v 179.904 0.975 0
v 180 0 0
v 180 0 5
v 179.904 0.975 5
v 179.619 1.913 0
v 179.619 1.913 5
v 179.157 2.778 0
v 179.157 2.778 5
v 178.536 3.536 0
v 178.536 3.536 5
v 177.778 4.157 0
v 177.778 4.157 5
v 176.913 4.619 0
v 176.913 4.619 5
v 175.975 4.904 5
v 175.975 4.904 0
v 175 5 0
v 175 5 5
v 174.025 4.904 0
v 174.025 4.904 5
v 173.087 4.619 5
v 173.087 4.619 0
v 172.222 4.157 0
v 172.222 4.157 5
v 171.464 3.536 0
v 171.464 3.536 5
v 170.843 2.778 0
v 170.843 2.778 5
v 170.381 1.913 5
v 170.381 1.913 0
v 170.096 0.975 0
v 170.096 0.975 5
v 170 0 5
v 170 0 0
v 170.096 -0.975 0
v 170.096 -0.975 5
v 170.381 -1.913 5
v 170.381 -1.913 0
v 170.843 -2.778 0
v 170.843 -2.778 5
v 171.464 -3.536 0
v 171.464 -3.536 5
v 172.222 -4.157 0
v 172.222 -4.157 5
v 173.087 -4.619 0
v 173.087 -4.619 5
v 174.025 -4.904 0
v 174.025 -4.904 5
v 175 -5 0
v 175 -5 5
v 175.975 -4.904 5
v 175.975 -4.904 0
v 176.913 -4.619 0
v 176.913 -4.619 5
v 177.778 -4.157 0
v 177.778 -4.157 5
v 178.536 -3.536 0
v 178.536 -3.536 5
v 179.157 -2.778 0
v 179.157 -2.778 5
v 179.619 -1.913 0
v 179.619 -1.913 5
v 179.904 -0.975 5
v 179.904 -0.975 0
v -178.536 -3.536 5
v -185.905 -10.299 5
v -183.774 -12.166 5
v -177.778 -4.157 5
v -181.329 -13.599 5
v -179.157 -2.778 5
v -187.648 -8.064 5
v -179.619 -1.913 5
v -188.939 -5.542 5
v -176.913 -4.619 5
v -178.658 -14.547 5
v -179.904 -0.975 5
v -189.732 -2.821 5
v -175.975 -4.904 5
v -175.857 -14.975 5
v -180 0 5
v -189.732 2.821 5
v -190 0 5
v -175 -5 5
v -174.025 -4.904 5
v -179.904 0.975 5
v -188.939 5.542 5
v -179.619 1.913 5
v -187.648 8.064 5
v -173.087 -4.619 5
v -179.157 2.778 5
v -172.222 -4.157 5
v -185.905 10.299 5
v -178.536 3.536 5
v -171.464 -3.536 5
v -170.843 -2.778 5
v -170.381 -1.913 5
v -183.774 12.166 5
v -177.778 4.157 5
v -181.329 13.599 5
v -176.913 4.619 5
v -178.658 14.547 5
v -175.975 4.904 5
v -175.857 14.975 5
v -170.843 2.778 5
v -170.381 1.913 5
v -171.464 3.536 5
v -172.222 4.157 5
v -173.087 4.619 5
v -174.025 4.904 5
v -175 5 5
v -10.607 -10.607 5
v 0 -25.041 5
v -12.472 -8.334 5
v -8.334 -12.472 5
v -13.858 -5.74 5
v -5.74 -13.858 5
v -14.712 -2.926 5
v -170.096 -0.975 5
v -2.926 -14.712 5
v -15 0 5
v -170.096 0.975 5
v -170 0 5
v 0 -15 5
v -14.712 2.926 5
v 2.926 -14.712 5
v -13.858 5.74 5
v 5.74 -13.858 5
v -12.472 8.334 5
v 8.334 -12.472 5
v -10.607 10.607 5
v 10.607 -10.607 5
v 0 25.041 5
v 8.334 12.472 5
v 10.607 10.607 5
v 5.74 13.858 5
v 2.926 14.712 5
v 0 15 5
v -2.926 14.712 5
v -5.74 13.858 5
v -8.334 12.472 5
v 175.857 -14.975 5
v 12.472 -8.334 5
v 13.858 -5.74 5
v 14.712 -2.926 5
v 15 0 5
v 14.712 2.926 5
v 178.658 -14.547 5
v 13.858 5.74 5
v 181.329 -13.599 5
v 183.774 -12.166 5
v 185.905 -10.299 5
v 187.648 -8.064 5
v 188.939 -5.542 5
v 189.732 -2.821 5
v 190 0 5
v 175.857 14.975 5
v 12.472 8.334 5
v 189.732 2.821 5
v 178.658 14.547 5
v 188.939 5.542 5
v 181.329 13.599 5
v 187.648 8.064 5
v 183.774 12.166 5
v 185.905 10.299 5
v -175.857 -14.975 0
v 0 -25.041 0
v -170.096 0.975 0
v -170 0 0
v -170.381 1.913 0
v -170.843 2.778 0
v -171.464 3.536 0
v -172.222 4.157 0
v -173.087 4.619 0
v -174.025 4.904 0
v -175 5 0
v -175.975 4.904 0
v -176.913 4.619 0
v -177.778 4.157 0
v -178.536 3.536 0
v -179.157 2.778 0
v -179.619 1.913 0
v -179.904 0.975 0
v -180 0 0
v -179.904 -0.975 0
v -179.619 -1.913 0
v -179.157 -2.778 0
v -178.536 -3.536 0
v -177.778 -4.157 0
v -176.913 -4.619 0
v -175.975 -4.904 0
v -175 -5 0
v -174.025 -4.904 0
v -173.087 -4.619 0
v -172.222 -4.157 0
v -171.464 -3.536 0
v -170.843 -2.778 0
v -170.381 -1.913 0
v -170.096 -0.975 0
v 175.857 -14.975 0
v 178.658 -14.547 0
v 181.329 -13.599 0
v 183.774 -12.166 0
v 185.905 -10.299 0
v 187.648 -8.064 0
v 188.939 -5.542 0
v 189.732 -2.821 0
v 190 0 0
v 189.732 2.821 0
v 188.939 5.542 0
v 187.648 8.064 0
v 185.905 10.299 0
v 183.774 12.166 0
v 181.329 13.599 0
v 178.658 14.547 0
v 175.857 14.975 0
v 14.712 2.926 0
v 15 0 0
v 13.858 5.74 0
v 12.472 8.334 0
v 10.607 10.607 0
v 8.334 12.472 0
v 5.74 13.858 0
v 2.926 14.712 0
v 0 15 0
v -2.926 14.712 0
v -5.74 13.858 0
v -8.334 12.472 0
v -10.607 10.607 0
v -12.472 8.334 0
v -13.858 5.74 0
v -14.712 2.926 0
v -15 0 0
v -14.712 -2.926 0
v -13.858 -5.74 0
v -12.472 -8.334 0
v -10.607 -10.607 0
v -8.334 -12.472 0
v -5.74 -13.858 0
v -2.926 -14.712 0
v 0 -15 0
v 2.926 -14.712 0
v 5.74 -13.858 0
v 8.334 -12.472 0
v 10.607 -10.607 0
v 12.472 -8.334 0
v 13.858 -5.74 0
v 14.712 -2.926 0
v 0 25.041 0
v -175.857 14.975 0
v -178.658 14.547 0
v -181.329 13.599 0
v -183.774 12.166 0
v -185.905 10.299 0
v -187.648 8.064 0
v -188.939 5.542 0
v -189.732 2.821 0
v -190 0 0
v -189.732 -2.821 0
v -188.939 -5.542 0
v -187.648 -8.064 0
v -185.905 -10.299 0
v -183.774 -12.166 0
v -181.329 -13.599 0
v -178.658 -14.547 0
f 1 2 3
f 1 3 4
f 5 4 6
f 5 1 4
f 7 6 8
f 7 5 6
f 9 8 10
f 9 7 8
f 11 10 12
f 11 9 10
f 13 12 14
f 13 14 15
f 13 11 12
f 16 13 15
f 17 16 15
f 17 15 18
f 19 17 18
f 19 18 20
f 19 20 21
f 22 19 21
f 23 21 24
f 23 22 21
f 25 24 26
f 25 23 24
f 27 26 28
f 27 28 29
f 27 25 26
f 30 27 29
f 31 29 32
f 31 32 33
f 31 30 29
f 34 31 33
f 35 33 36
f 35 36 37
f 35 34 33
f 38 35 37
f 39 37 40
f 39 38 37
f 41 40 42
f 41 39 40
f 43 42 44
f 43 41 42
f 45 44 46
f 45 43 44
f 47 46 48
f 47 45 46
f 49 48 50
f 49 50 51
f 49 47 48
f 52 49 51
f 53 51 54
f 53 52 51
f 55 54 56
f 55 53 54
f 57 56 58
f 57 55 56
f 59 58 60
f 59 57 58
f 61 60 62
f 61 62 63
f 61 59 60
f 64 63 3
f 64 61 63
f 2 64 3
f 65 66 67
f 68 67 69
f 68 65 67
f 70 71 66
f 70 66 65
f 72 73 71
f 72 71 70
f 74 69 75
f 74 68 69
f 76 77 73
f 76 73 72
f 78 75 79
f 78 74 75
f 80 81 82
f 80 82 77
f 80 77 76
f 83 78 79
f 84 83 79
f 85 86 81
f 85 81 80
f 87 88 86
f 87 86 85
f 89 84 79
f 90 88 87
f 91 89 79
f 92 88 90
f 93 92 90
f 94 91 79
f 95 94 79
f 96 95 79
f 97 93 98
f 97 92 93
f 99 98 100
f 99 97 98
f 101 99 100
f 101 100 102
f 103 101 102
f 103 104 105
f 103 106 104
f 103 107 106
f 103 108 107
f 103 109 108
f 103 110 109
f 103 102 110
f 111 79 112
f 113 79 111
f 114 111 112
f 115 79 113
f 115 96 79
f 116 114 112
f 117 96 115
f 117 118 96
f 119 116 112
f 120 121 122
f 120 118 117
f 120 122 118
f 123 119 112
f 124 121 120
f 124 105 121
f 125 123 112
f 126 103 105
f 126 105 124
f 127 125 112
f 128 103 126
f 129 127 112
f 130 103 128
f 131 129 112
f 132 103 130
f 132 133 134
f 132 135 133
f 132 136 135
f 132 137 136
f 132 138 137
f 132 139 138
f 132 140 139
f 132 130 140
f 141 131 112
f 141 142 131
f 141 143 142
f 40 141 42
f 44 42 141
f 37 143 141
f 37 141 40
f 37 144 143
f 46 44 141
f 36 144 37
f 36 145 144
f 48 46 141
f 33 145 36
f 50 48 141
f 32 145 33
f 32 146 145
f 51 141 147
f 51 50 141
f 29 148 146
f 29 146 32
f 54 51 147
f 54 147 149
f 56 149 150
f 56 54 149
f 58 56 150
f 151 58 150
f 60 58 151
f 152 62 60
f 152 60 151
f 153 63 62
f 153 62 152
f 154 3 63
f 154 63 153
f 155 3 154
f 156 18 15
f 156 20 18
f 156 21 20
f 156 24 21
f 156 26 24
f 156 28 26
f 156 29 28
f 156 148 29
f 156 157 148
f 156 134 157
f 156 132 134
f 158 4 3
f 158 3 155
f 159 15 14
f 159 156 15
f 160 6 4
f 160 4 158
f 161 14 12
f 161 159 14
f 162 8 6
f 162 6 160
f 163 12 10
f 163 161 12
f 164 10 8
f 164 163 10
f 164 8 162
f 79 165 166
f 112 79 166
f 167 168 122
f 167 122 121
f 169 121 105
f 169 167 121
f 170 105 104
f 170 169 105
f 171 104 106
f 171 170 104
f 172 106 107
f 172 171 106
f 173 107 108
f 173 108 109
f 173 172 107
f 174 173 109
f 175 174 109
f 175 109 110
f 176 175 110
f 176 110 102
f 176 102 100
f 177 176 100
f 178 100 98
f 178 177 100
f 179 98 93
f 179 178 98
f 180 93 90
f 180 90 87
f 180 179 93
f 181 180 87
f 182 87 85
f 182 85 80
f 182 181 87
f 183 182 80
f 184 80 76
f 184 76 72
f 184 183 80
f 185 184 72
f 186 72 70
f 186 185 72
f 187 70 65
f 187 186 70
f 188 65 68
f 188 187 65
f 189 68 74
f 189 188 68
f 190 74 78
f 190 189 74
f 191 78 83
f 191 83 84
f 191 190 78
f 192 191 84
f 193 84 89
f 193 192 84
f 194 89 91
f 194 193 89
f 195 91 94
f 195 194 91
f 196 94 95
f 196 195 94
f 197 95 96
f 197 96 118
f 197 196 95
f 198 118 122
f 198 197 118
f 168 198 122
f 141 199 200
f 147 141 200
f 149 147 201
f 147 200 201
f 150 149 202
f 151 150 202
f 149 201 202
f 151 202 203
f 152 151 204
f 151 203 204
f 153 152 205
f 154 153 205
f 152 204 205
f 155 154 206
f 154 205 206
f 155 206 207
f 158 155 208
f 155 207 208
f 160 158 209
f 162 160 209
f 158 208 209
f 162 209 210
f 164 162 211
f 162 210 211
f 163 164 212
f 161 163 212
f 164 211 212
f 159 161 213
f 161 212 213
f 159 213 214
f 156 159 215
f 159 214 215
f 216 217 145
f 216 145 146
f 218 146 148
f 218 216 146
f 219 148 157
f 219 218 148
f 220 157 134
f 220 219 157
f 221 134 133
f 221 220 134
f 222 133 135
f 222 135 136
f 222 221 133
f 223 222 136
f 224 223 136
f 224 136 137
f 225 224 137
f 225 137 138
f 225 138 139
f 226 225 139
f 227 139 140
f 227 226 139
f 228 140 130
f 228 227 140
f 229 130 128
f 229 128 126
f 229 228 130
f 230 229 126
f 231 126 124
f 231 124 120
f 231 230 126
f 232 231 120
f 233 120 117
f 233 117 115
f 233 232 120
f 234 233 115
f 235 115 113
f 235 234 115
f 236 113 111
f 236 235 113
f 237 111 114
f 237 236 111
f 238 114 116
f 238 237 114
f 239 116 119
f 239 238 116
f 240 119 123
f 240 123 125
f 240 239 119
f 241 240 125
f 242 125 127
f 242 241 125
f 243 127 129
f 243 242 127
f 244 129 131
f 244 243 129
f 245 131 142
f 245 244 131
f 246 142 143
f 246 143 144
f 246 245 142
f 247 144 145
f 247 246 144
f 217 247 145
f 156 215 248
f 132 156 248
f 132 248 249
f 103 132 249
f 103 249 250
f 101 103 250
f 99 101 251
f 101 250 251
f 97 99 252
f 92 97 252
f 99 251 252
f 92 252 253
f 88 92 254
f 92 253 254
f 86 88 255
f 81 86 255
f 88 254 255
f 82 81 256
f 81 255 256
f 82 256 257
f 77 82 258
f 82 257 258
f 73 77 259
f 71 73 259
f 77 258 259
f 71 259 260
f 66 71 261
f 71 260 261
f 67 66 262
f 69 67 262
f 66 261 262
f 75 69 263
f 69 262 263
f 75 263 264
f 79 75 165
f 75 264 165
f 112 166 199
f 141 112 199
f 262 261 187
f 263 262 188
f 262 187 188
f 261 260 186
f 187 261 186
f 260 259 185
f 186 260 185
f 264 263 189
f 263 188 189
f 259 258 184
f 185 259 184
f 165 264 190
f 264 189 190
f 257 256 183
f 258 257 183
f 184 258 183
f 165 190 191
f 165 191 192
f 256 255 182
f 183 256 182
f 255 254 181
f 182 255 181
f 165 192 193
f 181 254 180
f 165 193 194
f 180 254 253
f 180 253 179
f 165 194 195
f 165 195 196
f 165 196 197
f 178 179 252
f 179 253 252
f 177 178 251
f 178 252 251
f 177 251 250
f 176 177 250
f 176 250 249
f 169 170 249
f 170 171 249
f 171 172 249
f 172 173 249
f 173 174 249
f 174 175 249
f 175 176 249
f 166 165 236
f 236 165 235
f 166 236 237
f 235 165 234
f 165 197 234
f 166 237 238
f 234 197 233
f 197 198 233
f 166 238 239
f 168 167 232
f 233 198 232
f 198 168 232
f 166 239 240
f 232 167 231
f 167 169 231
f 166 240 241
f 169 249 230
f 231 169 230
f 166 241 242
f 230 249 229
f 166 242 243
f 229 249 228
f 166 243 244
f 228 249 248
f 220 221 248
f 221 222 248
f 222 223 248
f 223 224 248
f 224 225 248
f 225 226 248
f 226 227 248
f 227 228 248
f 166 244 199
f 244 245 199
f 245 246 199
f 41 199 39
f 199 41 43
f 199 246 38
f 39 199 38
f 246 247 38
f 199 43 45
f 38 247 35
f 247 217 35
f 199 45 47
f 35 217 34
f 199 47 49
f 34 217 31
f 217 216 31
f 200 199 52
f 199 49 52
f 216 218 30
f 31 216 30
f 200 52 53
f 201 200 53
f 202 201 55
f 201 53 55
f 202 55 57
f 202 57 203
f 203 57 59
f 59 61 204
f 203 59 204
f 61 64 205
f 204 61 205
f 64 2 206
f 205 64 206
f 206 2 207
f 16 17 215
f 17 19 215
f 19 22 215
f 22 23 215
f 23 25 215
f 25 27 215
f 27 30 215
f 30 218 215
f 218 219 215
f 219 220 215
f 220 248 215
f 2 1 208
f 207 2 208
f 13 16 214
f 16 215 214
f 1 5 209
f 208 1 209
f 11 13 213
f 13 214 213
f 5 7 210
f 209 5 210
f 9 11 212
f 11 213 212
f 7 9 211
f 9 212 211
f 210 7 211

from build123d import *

# Parameters (mm, degrees)
SKETCH1_R           = 5
SKETCH1_R_2         = 15
BOSS_EXTRUDE1_DEPTH = 5


with BuildPart() as part:
    # Sketch1 → Boss-Extrude1 (new body)
    with BuildSketch(Plane.XY):
        with BuildLine():
            Line((0, 25.040916558), (-175.857142857, 14.97549018))
            ThreePointArc((-175.857142857, 14.97549018), (-190, 0), (-175.857142857, -14.97549018))
            Line((-175.857142857, -14.97549018), (0, -25.040916558))
            Line((0, -25.040916558), (175.857142857, -14.97549018))
            ThreePointArc((175.857142857, -14.97549018), (190, 0), (175.857142857, 14.97549018))
            Line((175.857142857, 14.97549018), (0, 25.040916558))
        make_face()
        with Locations((-175, 0)):
            Circle(SKETCH1_R, mode=Mode.SUBTRACT)
        Circle(SKETCH1_R_2, mode=Mode.SUBTRACT)
        with Locations((175, 0)):
            Circle(SKETCH1_R, mode=Mode.SUBTRACT)
    extrude(amount=BOSS_EXTRUDE1_DEPTH)


solid = part.part
